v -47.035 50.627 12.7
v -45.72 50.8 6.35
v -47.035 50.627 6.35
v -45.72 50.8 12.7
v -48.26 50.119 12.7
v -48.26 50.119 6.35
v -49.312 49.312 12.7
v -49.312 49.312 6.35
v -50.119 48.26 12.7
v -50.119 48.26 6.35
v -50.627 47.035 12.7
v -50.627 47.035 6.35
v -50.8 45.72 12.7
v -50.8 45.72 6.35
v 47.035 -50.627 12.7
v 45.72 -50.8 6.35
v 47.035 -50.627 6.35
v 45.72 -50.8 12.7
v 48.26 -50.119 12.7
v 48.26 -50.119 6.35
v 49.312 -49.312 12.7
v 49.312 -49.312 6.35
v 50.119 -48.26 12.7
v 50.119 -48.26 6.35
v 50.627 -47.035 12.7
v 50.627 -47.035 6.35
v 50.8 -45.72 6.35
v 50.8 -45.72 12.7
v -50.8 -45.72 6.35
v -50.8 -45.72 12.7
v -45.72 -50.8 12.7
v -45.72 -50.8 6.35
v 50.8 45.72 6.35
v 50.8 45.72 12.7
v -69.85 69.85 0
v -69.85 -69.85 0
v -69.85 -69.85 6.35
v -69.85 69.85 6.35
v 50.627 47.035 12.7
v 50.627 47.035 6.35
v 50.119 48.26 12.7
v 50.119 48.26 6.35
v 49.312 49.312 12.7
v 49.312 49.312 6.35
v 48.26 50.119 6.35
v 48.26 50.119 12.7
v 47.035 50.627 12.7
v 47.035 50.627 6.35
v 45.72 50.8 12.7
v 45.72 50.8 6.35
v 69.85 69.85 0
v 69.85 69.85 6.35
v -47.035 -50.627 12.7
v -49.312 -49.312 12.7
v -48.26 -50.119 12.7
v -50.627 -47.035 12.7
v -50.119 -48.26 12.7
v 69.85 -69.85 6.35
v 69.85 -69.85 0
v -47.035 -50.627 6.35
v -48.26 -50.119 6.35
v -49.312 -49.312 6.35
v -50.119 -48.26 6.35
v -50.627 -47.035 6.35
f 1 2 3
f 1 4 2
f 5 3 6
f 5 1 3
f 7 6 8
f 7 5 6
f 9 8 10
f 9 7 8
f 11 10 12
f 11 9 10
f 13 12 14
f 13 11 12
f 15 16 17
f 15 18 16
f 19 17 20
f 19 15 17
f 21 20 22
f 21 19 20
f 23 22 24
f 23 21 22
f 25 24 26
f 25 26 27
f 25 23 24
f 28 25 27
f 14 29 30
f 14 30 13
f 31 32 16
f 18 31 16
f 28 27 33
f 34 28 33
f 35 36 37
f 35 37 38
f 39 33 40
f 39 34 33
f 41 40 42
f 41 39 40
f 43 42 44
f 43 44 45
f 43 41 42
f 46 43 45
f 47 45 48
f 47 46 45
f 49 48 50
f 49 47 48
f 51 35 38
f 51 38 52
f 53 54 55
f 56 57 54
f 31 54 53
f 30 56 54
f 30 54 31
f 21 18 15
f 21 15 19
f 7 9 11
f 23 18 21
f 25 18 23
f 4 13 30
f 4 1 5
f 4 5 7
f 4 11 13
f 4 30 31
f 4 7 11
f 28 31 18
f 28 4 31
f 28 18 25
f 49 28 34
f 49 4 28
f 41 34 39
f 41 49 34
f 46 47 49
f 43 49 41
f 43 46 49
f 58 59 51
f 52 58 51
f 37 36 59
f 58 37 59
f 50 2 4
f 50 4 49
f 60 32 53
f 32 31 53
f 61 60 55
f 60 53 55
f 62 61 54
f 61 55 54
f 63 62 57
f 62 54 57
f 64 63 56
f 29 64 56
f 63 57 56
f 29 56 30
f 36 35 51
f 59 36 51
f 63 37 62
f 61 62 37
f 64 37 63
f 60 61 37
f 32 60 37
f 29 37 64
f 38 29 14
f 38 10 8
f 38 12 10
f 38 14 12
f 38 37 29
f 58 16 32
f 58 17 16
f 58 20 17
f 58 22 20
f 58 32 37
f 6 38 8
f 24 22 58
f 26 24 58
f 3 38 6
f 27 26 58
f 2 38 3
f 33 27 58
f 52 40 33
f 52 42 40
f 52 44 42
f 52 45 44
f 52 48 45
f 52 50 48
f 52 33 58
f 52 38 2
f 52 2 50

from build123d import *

# Parameters (mm, degrees)
F0_W     = 139.7
F0_H     = 139.7
F1_DEPTH = 6.35
F2_W     = 101.6
F2_H     = 101.6
F3_DEPTH = 6.35
F4_R     = 5.08


with BuildPart() as f1:
    # F0 (on Top) → F1 (new body)
    with BuildSketch(Plane.XY):
        Rectangle(F0_W, F0_H)
    extrude(amount=F1_DEPTH)

    # F2 (on face) → F3 (join)
    with BuildSketch(Plane.XY.offset(6.35)):
        Rectangle(F2_W, F2_H)
    extrude(amount=F3_DEPTH)

    # F4
    f4_edges = [f1.edges().sort_by_distance(p)[0] for p in [
        (50.8, -50.8, 9.525),
        (50.8, 50.8, 9.525),
        (-50.8, -50.8, 9.525),
        (-50.8, 50.8, 9.525),
    ]]
    fillet(f4_edges, radius=F4_R)


solid = f1.part
